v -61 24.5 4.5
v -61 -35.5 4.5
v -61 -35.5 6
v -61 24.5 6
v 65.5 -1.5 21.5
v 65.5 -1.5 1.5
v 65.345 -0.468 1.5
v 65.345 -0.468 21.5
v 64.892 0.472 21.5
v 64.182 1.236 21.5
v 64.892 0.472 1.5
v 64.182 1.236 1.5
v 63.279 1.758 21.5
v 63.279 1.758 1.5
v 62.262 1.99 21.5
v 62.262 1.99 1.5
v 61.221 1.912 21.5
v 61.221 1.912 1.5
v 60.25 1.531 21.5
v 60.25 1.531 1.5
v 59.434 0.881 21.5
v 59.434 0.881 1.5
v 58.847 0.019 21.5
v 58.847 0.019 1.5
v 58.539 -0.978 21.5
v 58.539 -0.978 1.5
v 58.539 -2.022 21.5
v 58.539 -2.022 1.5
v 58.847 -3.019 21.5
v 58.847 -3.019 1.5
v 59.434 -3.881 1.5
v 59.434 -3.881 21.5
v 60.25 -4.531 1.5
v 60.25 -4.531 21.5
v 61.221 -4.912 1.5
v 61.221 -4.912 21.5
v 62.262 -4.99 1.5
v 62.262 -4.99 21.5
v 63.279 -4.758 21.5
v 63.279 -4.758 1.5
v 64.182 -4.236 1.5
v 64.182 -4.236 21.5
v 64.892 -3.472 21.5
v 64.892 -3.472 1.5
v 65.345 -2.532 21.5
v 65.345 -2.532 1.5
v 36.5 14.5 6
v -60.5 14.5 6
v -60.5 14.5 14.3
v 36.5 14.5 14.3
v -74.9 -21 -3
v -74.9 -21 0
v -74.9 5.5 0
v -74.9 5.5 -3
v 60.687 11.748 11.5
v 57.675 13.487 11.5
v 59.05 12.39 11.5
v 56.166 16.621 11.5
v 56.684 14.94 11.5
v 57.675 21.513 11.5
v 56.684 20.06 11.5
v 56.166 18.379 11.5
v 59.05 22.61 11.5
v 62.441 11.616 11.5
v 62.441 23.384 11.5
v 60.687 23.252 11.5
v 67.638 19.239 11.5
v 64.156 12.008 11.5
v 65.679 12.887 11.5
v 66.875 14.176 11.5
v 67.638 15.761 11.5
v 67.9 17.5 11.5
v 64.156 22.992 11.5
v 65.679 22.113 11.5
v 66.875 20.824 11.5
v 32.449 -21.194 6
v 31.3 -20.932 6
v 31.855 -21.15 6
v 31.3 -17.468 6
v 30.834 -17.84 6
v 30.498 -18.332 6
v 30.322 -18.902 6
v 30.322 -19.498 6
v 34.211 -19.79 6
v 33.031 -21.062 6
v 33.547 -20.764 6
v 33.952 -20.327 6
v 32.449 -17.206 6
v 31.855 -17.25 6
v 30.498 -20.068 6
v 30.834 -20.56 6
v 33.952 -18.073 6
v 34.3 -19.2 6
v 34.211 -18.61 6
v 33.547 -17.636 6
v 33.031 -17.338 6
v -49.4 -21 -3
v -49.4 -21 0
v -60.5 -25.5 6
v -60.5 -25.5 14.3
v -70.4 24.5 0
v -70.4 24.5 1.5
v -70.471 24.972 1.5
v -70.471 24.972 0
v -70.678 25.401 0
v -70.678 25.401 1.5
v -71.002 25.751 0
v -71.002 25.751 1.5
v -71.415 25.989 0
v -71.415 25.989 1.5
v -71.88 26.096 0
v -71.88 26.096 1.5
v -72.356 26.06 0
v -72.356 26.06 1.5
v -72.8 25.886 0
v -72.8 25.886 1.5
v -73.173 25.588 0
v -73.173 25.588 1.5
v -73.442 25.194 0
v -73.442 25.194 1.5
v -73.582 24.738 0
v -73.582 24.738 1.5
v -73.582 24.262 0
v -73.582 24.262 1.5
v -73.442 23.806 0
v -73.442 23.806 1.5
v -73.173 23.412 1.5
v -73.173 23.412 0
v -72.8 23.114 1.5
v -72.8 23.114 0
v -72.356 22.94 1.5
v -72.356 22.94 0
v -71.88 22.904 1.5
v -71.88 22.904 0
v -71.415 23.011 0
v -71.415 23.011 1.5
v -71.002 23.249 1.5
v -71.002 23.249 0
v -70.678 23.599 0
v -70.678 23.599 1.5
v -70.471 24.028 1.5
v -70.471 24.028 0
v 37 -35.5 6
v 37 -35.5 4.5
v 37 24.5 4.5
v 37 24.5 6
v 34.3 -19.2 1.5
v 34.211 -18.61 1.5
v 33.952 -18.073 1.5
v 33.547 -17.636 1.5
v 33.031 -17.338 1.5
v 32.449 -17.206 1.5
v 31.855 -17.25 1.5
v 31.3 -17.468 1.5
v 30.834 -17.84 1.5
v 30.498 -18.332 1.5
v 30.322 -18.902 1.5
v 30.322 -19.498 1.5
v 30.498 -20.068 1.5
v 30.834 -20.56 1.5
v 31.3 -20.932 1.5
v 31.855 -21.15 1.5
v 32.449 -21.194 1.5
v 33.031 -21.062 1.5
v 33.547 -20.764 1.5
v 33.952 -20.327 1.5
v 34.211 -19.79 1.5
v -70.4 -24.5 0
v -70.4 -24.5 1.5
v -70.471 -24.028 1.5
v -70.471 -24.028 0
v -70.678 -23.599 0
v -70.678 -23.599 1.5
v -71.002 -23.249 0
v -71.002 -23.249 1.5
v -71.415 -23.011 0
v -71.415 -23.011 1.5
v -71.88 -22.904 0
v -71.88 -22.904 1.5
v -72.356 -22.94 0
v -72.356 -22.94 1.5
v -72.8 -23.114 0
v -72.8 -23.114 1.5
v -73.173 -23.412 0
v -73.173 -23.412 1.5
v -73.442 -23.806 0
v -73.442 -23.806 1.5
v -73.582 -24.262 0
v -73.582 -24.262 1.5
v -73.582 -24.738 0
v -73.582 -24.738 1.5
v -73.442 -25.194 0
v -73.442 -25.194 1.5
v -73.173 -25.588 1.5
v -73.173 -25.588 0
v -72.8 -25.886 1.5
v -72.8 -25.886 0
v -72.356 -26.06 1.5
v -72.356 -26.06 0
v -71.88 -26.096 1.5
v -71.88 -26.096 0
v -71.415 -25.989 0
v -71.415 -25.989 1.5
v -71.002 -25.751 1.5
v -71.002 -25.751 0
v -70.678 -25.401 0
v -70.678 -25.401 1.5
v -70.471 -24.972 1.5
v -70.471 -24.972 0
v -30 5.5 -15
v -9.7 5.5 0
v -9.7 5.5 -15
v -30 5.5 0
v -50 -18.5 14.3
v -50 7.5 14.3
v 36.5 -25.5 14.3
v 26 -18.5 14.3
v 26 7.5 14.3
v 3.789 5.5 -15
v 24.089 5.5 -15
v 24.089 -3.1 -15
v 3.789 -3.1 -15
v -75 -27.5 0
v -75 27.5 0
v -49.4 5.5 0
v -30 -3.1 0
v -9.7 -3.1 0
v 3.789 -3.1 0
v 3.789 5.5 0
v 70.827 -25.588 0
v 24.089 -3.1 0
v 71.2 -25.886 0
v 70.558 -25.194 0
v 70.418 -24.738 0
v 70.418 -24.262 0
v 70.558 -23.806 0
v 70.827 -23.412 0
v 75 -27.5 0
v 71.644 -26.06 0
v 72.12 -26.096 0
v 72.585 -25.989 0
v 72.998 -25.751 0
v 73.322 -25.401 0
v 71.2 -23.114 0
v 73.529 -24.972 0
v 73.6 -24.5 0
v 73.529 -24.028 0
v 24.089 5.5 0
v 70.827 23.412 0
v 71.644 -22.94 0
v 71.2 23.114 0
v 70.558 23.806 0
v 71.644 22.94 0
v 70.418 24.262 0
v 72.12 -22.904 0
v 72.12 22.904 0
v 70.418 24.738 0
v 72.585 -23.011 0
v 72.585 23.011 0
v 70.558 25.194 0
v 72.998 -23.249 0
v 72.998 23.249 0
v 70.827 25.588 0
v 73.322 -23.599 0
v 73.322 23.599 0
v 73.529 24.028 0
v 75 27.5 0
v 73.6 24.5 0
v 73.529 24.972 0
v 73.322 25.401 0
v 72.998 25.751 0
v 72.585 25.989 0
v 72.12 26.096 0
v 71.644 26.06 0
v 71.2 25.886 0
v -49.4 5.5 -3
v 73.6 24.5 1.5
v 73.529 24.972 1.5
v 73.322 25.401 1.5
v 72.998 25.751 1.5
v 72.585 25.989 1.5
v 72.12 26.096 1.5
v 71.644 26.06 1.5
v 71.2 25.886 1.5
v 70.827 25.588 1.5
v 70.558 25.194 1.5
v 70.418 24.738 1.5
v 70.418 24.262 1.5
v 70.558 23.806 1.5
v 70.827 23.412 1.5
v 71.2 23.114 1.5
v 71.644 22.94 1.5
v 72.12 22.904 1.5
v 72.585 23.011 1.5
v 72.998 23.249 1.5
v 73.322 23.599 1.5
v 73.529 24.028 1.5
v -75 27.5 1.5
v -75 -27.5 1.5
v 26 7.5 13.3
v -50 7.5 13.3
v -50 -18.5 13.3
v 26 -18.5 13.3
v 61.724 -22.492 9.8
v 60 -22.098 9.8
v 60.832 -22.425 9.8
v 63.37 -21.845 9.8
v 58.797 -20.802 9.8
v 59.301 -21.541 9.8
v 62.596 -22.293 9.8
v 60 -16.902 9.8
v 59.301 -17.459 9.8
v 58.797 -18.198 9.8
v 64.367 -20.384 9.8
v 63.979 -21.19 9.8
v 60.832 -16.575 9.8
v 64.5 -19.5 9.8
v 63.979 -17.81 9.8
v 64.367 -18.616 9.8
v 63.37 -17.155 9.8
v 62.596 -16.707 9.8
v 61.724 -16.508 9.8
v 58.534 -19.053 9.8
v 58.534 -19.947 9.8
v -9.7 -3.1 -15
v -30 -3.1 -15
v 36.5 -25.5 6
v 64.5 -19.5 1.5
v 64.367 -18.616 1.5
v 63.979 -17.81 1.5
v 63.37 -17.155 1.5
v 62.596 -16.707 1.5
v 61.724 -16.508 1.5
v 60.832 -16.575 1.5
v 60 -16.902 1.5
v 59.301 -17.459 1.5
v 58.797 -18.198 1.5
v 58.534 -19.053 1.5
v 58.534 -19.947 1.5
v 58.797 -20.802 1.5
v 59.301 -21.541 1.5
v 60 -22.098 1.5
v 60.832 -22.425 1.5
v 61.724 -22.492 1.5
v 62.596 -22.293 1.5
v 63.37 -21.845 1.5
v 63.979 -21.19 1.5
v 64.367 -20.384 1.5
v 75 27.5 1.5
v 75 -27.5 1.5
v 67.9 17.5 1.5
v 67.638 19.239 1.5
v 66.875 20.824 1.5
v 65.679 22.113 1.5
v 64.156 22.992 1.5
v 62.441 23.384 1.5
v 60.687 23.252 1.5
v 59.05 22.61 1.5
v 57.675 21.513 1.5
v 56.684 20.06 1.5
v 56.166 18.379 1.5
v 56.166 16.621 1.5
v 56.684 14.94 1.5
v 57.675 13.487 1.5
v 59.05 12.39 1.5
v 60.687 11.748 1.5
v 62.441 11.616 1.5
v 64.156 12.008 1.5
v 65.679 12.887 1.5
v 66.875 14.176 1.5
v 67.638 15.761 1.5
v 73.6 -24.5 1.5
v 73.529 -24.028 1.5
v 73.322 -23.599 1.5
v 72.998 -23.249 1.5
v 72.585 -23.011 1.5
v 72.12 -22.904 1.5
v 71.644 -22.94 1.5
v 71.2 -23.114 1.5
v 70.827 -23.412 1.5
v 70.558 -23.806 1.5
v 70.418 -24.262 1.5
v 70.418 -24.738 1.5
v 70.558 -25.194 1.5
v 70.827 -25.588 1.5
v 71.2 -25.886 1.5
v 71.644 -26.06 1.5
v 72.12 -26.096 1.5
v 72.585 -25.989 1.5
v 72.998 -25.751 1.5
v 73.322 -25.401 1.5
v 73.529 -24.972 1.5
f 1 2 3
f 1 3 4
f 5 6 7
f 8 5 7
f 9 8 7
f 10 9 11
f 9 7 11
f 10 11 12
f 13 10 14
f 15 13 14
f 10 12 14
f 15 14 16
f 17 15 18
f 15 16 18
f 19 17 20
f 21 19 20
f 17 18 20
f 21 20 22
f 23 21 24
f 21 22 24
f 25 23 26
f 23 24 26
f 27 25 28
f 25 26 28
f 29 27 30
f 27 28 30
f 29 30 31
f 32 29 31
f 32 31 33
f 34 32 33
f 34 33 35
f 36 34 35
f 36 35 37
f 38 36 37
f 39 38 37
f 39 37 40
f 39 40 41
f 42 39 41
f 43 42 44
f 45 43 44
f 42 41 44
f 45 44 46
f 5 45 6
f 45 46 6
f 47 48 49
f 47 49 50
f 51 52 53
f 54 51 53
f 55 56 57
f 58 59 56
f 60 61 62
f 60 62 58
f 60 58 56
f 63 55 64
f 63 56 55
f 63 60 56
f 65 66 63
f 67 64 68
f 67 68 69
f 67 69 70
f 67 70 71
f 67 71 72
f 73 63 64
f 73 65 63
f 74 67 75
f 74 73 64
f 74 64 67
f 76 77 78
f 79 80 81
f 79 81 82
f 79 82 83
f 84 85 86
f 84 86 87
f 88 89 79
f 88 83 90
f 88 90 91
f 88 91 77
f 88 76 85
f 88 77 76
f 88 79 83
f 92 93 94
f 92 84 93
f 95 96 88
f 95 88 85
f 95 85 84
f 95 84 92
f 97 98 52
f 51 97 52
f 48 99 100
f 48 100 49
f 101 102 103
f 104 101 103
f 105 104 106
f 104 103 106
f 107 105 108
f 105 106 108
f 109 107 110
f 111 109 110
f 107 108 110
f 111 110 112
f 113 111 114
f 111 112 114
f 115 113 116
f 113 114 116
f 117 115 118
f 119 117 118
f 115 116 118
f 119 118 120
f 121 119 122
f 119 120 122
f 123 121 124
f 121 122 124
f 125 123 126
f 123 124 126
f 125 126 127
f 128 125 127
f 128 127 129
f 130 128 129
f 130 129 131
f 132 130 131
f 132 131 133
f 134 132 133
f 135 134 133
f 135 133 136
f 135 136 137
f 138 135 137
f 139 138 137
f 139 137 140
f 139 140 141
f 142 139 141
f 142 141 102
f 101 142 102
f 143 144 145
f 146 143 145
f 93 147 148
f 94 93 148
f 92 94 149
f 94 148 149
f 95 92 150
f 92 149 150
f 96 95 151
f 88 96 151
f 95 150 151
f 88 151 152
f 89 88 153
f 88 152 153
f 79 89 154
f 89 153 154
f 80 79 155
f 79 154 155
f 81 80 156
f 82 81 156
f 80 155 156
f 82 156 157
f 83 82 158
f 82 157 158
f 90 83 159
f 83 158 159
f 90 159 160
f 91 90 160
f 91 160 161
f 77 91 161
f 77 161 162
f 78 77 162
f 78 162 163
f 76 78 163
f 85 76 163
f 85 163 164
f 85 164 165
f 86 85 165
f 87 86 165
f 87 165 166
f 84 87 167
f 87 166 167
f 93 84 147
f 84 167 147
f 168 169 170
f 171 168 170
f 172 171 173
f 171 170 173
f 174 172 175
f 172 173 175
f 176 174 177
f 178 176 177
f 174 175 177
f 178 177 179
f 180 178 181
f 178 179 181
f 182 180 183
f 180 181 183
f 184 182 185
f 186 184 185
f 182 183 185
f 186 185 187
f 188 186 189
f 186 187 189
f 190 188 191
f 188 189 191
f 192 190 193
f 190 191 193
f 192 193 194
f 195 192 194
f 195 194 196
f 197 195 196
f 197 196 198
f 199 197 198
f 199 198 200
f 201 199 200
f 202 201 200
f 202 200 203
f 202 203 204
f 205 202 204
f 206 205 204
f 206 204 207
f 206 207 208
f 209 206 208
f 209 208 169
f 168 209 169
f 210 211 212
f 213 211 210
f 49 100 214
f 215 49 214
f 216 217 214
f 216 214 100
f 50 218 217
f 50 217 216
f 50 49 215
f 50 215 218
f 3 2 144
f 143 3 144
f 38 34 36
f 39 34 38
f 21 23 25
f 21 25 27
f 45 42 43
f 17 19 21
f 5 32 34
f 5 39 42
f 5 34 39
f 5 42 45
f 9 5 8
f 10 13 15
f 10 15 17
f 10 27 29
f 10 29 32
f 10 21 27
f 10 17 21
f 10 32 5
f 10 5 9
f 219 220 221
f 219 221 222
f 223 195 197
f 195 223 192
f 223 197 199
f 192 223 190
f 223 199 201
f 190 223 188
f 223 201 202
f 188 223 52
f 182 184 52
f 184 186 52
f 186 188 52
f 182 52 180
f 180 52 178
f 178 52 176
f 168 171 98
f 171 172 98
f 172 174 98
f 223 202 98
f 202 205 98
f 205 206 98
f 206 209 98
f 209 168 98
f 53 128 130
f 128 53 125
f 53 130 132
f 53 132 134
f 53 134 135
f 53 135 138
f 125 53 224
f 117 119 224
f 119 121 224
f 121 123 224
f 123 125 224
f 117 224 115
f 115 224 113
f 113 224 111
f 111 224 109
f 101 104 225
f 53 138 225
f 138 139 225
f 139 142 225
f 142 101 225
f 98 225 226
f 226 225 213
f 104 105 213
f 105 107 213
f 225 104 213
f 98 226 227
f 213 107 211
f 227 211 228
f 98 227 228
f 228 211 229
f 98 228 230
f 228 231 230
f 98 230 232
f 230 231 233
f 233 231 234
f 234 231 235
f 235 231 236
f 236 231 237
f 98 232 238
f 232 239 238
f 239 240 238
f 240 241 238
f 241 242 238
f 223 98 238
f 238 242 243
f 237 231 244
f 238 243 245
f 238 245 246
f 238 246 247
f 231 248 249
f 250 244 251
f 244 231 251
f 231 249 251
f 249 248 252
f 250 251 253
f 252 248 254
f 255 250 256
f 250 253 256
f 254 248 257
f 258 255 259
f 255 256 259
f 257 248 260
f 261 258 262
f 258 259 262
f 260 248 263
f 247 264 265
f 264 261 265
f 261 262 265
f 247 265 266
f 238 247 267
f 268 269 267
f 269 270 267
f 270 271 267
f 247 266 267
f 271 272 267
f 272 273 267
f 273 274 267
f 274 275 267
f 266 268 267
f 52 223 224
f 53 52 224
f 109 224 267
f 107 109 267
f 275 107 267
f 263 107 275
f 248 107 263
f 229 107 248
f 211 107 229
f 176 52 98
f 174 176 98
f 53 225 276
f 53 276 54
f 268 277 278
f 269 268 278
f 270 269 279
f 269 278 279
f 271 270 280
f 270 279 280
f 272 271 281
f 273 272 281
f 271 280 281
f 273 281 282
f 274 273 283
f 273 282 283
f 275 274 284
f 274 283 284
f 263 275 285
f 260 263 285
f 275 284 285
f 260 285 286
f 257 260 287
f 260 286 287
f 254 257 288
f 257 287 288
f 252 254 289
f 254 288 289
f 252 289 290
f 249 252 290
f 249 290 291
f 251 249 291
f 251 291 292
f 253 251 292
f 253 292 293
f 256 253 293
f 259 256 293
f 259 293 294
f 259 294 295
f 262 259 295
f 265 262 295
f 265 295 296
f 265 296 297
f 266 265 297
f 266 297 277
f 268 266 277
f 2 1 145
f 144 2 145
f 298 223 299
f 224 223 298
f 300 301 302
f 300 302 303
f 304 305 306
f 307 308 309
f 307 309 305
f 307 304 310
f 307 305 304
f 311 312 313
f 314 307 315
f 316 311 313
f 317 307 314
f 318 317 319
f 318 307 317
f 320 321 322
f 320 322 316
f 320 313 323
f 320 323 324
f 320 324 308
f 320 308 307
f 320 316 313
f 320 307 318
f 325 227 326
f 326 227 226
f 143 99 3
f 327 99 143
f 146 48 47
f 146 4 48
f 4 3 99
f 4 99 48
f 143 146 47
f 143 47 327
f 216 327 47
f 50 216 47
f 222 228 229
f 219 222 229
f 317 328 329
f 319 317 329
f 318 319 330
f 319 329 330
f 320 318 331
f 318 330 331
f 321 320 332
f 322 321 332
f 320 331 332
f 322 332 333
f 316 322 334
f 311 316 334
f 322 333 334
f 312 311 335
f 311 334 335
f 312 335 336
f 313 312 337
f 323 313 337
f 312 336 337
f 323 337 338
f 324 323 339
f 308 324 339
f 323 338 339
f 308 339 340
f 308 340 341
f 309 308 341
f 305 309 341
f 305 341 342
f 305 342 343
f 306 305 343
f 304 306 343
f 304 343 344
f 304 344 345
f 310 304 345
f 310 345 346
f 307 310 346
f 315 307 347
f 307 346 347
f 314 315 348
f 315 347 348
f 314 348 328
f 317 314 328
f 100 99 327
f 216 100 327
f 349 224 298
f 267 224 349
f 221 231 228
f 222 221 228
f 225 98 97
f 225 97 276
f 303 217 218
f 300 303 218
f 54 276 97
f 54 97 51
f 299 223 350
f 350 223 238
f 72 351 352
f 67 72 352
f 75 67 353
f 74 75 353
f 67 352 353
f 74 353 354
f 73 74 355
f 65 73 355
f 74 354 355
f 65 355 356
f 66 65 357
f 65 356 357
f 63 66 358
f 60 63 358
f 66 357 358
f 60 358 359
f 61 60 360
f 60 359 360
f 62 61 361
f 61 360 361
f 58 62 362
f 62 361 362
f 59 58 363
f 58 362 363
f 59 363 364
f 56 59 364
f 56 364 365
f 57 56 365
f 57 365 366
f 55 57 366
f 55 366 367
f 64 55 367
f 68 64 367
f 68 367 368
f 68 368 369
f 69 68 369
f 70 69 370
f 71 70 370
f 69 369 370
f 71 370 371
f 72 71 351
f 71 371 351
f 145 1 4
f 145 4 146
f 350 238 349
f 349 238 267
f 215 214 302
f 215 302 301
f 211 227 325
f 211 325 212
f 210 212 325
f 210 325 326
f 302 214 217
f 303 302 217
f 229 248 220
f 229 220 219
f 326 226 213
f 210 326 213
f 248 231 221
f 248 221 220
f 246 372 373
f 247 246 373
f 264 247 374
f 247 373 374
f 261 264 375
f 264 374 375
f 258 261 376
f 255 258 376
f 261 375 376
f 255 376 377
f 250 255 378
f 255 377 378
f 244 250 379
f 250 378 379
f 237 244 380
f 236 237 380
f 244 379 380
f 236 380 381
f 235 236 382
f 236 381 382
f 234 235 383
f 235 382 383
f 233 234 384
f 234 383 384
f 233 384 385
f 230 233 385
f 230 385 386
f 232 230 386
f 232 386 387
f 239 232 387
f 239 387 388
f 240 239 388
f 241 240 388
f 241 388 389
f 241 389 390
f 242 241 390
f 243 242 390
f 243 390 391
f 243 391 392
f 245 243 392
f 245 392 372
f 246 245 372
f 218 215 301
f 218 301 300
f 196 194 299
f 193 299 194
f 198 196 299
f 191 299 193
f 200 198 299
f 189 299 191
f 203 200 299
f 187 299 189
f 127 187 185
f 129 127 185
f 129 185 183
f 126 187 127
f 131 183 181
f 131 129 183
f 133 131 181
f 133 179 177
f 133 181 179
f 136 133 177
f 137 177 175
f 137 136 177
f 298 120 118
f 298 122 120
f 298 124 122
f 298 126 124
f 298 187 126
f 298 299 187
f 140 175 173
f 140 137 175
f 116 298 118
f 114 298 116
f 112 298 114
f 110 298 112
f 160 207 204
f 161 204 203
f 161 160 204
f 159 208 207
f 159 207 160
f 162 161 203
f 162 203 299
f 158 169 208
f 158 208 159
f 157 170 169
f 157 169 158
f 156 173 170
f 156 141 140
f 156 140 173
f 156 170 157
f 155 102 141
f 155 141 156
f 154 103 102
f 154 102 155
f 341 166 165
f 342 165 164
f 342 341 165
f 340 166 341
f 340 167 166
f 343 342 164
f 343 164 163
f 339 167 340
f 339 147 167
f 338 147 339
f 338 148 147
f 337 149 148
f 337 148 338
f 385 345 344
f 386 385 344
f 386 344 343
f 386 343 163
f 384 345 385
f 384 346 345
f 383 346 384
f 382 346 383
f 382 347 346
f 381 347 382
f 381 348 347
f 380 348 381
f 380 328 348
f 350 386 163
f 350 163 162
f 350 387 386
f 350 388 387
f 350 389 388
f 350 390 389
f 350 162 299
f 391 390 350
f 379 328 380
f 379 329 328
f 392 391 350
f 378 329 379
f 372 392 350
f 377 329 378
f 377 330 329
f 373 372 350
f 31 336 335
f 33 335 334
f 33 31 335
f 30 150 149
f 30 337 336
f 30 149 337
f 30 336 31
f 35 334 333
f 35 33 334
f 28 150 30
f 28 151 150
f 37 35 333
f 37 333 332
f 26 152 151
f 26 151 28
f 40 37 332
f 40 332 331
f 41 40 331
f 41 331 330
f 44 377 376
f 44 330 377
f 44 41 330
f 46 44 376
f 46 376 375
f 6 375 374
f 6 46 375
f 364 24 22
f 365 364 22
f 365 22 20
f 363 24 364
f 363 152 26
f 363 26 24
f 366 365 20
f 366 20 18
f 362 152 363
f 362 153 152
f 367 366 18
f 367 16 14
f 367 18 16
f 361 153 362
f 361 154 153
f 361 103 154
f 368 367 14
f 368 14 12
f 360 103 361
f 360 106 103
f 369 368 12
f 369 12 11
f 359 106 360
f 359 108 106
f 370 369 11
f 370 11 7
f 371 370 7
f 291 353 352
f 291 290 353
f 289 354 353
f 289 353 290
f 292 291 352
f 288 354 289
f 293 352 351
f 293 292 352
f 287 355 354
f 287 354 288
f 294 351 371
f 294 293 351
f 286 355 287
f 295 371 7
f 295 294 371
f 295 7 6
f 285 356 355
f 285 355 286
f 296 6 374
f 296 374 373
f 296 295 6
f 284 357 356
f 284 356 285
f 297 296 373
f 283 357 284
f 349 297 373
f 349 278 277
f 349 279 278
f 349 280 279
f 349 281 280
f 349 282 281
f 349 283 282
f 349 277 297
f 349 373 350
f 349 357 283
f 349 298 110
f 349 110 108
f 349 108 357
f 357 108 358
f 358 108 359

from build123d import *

# Parameters (mm, degrees)
ESBO_O1_W                = 150
ESBO_O1_H                = 55
RESSALTO_EXTRUS_O1_DEPTH = 1.5
RESSALTO_EXTRUS_O2_START = 3
ESBO_O3_W                = 98
ESBO_O3_H                = 60
RESSALTO_EXTRUS_O2_DEPTH = 1.5
ESBO_O4_W                = 97
ESBO_O4_H                = 40
RESSALTO_EXTRUS_O3_DEPTH = 8.3
ESBO_O5_W                = 76
ESBO_O5_H                = 26
CORTE_EXTRUS_O1_DEPTH    = 1
ESBO_O6_R                = 3.5
RESSALTO_EXTRUS_O4_DEPTH = 20
ESBO_O7_R                = 2
RESSALTO_EXTRUS_O5_DEPTH = 4.5
ESBO_O8_R                = 5.9
RESSALTO_EXTRUS_O6_DEPTH = 10
ESBO_O9_R                = 3
RESSALTO_EXTRUS_O7_DEPTH = 8.3
ESBO_O11_W               = 20.3
ESBO_O11_H               = 8.6
RESSALTO_EXTRUS_O8_DEPTH = 15
ESBO_O12_W               = 25.5
ESBO_O12_H               = 26.5
RESSALTO_EXTRUS_O9_DEPTH = 3
ESBO_O13_R               = 1.6
CORTE_EXTRUS_O2_DEPTH    = 10


with BuildPart() as part:
    # Esboço1 → Ressalto-extrusão1 (new body)
    with BuildSketch(Plane.XY):
        Rectangle(ESBO_O1_W, ESBO_O1_H)
    extrude(amount=RESSALTO_EXTRUS_O1_DEPTH)

    # Esboço6 → Ressalto-extrusão4 (add)
    with BuildSketch(Plane.XY.offset(1.5)):
        with Locations((62, -1.5)):
            Circle(ESBO_O6_R)
    extrude(amount=RESSALTO_EXTRUS_O4_DEPTH)

    # Esboço7 → Ressalto-extrusão5 (add)
    with BuildSketch(Plane.XY.offset(1.5)):
        with Locations((32.3, -19.2)):
            Circle(ESBO_O7_R)
    extrude(amount=RESSALTO_EXTRUS_O5_DEPTH)

    # Esboço8 → Ressalto-extrusão6 (add)
    with BuildSketch(Plane.XY.offset(1.5)):
        with Locations((62, 17.5)):
            Circle(ESBO_O8_R)
    extrude(amount=RESSALTO_EXTRUS_O6_DEPTH)

    # Esboço9 → Ressalto-extrusão7 (add)
    with BuildSketch(Plane.XY.offset(1.5)):
        with Locations((61.5, -19.5)):
            Circle(ESBO_O9_R)
    extrude(amount=RESSALTO_EXTRUS_O7_DEPTH)

    # Esboço11 → Ressalto-extrusão8 (add)
    with BuildSketch(Plane(origin=(0, 0, 0), x_dir=(-1, 0, 0), z_dir=(0, 0, -1))):
        with Locations((-13.938731824, 1.2)):
            Rectangle(ESBO_O11_W, ESBO_O11_H)
        with Locations((19.85, 1.2)):
            Rectangle(ESBO_O11_W, ESBO_O11_H)
    extrude(amount=RESSALTO_EXTRUS_O8_DEPTH)

    # Esboço12 → Ressalto-extrusão9 (add)
    with BuildSketch(Plane(origin=(0, 0, 0), x_dir=(-1, 0, 0), z_dir=(0, 0, -1))):
        with Locations((62.15, -7.75)):
            Rectangle(ESBO_O12_W, ESBO_O12_H)
    extrude(amount=RESSALTO_EXTRUS_O9_DEPTH)

    # Esboço13 → Corte-extrusão2 (cut)
    with BuildSketch(Plane.XY.offset(1.5)):
        with Locations((-72, 24.5)):
            Circle(ESBO_O13_R)
        with Locations((-72, -24.5)):
            Circle(ESBO_O13_R)
        with Locations((72, -24.5)):
            Circle(ESBO_O13_R)
        with Locations((72, 24.5)):
            Circle(ESBO_O13_R)
    extrude(amount=-CORTE_EXTRUS_O2_DEPTH, mode=Mode.SUBTRACT)


with BuildPart() as body_2:
    # Esboço3 → Ressalto-extrusão2 (new body)
    with BuildSketch(Plane.XY.offset(1.5).offset(RESSALTO_EXTRUS_O2_START)):
        with Locations((-12, -5.5)):
            Rectangle(ESBO_O3_W, ESBO_O3_H)
    extrude(amount=RESSALTO_EXTRUS_O2_DEPTH)

    # Esboço4 → Ressalto-extrusão3 (add)
    with BuildSketch(Plane.XY.offset(6)):
        with Locations((-12, -5.5)):
            Rectangle(ESBO_O4_W, ESBO_O4_H)
    extrude(amount=RESSALTO_EXTRUS_O3_DEPTH)

    # Esboço5 → Corte-extrusão1 (cut)
    with BuildSketch(Plane.XY.offset(14.3)):
        with Locations((-12, -5.5)):
            Rectangle(ESBO_O5_W, ESBO_O5_H)
    extrude(amount=-CORTE_EXTRUS_O1_DEPTH, mode=Mode.SUBTRACT)


solid = Compound([part.part, body_2.part])
